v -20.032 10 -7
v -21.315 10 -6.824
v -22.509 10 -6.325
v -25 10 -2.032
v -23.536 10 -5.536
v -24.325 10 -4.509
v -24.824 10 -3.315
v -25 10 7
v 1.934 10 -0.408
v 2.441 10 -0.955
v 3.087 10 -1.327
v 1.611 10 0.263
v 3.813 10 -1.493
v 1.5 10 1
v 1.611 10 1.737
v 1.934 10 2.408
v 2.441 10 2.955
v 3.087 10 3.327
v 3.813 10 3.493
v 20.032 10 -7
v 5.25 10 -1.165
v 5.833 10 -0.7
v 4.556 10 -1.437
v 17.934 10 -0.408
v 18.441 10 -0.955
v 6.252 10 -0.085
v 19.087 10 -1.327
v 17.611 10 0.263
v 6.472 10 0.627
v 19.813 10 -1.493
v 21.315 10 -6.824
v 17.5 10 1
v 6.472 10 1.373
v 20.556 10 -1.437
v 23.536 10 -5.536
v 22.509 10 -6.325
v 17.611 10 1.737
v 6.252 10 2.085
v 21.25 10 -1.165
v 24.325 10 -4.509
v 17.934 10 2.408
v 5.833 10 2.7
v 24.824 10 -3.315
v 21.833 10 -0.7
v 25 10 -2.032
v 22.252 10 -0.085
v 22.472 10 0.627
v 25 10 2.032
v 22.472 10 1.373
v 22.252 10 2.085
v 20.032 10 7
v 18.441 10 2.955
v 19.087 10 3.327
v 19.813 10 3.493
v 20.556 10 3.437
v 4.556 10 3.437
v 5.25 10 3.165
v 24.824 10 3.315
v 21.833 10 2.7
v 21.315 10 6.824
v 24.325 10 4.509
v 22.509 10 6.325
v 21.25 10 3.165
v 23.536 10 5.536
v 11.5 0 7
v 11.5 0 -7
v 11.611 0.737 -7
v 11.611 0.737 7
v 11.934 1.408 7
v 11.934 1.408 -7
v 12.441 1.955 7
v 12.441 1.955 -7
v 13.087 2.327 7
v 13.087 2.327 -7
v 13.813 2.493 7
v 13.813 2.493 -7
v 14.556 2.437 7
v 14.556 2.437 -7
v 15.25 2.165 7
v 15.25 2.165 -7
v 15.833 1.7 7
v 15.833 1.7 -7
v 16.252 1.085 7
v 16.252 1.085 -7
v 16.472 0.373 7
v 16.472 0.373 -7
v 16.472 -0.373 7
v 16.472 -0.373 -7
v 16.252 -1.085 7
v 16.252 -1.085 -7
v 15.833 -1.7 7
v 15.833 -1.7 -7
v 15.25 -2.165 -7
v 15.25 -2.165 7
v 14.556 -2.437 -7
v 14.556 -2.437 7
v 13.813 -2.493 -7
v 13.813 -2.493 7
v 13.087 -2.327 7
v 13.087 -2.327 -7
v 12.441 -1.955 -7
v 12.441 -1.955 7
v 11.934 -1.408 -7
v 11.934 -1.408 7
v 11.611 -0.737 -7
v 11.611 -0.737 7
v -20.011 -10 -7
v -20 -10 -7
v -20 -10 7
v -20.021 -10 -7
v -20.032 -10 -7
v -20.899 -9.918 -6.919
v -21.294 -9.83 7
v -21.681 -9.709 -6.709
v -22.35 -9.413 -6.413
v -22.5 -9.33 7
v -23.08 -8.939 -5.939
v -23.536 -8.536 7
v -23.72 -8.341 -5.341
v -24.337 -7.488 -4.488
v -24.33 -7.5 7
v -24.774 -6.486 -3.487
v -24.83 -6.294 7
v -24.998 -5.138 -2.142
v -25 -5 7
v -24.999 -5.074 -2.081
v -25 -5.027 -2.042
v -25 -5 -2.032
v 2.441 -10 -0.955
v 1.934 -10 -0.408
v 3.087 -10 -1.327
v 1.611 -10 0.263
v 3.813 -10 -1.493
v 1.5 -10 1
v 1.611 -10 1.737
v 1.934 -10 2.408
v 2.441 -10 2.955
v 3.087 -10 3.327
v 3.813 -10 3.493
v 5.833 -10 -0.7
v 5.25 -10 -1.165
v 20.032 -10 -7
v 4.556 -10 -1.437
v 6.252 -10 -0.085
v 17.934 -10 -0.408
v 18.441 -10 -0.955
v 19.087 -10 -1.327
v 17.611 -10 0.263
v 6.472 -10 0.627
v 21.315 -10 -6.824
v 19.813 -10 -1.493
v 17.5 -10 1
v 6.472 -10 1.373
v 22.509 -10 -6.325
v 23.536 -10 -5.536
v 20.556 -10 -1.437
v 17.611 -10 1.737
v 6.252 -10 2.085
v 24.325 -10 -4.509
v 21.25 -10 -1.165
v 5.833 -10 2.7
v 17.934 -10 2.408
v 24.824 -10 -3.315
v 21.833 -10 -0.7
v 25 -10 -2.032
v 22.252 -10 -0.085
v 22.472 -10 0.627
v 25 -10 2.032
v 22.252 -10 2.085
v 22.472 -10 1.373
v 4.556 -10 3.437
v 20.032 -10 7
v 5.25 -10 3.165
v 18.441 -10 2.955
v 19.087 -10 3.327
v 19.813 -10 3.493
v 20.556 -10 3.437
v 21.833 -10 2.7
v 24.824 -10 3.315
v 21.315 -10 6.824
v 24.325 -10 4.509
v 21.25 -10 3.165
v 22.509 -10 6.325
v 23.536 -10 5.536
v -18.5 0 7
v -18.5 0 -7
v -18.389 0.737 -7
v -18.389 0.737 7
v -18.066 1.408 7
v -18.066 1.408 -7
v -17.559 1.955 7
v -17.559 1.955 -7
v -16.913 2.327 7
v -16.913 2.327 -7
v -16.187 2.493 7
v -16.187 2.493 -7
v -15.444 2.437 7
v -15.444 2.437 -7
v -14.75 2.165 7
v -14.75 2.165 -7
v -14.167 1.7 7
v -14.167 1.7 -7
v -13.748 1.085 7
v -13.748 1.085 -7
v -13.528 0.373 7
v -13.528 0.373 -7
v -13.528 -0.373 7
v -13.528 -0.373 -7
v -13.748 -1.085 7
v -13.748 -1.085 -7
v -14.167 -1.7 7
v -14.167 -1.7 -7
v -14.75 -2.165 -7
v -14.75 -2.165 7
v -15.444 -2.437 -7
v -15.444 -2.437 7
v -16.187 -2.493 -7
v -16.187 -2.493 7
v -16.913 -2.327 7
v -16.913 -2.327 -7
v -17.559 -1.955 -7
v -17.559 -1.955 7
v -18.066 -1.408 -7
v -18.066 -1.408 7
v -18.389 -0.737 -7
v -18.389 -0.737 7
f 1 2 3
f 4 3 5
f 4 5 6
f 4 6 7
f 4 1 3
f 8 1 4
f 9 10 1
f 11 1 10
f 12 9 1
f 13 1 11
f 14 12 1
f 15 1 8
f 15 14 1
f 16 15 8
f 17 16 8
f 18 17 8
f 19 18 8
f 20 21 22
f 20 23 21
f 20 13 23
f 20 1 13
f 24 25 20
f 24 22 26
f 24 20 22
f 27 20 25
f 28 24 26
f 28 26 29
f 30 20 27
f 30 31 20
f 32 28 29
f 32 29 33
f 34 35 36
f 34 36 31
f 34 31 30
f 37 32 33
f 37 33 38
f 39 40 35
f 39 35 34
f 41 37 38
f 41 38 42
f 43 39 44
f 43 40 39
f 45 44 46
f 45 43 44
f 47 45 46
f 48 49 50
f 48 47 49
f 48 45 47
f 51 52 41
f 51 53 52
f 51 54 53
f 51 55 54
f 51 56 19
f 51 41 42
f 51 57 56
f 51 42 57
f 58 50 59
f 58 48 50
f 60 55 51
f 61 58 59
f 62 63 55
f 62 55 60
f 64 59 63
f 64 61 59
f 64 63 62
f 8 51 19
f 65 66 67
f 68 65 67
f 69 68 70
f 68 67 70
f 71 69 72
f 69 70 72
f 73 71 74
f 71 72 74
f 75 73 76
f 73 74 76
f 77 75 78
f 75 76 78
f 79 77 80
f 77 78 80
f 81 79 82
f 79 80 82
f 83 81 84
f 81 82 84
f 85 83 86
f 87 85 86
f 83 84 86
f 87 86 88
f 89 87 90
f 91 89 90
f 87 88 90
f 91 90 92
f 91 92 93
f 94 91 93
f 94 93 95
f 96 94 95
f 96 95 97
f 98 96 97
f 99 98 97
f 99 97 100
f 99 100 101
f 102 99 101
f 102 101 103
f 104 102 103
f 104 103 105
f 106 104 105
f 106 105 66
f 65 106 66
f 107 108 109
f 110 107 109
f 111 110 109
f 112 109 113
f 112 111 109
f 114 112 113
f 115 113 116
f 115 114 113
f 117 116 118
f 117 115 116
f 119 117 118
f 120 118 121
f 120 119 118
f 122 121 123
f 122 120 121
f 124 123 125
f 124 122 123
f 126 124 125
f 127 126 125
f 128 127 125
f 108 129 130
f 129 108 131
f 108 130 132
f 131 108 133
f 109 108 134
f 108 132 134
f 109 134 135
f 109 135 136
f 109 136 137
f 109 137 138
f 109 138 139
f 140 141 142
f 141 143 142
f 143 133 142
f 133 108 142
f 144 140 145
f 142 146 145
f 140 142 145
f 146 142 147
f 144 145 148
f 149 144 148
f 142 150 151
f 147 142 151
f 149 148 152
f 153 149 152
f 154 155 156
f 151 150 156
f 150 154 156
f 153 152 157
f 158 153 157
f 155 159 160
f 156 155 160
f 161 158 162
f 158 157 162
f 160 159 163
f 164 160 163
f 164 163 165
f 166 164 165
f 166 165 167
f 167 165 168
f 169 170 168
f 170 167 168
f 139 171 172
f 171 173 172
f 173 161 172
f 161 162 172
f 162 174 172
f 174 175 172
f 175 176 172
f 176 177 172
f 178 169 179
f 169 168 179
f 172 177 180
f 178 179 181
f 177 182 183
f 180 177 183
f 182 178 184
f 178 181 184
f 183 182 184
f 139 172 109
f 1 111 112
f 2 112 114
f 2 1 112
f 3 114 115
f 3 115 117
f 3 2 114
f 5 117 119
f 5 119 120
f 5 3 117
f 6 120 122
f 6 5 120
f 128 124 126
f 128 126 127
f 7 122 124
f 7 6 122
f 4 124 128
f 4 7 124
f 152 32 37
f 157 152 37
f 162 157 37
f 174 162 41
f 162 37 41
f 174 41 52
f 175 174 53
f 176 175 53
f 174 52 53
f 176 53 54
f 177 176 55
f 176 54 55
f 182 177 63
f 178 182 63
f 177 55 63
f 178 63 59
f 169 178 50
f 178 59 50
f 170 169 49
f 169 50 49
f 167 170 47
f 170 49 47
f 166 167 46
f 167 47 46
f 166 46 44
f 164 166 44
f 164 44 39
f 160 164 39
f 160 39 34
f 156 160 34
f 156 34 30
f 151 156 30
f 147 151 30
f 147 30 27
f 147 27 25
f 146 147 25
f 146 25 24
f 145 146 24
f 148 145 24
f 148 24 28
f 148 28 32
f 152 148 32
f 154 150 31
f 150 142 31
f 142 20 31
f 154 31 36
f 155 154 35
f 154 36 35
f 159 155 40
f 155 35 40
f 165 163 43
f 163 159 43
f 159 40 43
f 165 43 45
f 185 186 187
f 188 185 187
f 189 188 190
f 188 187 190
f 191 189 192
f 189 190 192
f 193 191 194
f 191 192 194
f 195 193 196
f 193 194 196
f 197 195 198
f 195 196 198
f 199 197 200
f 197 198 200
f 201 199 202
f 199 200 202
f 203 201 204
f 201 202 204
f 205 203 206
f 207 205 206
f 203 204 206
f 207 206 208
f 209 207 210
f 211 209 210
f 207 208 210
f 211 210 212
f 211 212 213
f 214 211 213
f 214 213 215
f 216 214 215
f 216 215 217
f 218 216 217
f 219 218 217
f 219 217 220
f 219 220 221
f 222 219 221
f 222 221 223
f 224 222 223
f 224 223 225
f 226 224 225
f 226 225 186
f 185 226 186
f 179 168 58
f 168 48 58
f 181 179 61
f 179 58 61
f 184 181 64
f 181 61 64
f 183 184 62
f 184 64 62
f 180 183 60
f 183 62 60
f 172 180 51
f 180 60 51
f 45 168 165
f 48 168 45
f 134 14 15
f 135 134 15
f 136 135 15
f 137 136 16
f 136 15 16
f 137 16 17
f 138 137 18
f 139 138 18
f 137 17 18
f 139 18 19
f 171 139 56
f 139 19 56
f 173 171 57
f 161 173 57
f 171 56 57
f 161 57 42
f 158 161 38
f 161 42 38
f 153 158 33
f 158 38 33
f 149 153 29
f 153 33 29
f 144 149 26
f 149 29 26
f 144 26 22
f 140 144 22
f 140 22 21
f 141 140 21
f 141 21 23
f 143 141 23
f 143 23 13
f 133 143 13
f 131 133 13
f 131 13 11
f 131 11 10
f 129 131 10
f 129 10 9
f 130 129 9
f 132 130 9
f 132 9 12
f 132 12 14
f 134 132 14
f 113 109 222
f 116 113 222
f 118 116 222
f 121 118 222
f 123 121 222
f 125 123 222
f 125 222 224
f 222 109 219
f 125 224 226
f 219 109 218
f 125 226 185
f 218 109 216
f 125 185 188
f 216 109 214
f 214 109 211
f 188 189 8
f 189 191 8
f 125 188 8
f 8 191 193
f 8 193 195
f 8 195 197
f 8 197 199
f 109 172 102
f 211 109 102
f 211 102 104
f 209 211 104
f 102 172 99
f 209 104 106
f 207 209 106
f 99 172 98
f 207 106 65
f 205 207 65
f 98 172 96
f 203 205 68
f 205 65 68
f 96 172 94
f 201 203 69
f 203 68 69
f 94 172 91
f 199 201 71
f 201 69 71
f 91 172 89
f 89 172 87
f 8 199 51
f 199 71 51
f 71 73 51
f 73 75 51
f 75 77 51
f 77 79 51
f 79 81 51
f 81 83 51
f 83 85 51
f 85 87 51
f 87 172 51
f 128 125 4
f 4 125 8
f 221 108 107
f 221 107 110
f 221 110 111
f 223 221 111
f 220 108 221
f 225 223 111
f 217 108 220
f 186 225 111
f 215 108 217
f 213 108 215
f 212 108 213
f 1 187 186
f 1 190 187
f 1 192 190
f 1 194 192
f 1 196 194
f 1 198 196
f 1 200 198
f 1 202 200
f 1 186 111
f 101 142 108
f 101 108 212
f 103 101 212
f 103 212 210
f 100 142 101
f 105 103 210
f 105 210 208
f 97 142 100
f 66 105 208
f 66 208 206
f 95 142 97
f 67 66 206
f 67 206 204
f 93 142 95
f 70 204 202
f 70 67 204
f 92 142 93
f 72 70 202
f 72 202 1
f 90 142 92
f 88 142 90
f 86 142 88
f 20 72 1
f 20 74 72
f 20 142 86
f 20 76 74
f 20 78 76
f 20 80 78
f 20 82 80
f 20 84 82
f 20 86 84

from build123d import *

# Parameters (mm, degrees)
F0_W        = 20
F0_H        = 14
F1_DEPTH    = 25
F3_D        = 5
F5_D        = 5
F6_T1_DEPTH = 44.999500005
F7_T1_DEPTH = 34.0317226184


# Not quite as in the source:
# - a fillet or chamfer that OpenCascade refuses, or shapes differently, is made with other operations: its cross-section is extruded or revolved along the edge and cut away or added


with BuildPart() as f1:
    # F0 (on Right) → F1 (new body, symmetric)
    with BuildSketch(Plane.YZ):
        Rectangle(F0_W, F0_H)
    extrude(amount=F1_DEPTH, both=True)

    # F3 (through all)
    with Locations(Plane.XZ.offset(10)):
        with Locations((4, 1), (20, 1)):
            Hole(F3_D / 2)

    # F5 (through all)
    with Locations(Plane.XY.offset(7)):
        with Locations((-16, 0), (14, 0)):
            Hole(F5_D / 2)

    # F6: fillet of radius 5 on 3 edges, made by hand

    # F6_s2 → F6_t1 (cut)
    with BuildSketch(Plane.XZ.offset(-22.4997500025)):
        with BuildLine():
            ThreePointArc((25.0001, 2.0001), (23.5356339059, 5.5356339059), (20.0001, 7.0001))
            Line((20.0001, 7.0001), (20.0001, 7.1001))
            ThreePointArc((20.0001, 7.1001), (22.50005, 7.1), (25, 7.1))
            Line((25, 7.1), (25.1, 7))
            ThreePointArc((25.1, 7), (25.1, 4.50005), (25.1001, 2.0001))
            Line((25.1001, 2.0001), (25.0001, 2.0001))
        make_face()
        with BuildLine():
            ThreePointArc((-20.0001, -7.0001), (-23.5356339059, -5.5356339059), (-25.0001, -2.0001))
            Line((-25.0001, -2.0001), (-25.1001, -2.0001))
            ThreePointArc((-25.1001, -2.0001), (-25.1, -4.50005), (-25.1, -7))
            Line((-25.1, -7), (-25, -7.1))
            ThreePointArc((-25, -7.1), (-22.50005, -7.1), (-20.0001, -7.1001))
            Line((-20.0001, -7.1001), (-20.0001, -7.0001))
        make_face()
        with BuildLine():
            ThreePointArc((20.0001, -7.0001), (23.5356339059, -5.5356339059), (25.0001, -2.0001))
            Line((25.0001, -2.0001), (25.1001, -2.0001))
            ThreePointArc((25.1001, -2.0001), (25.1, -4.50005), (25.1, -7))
            Line((25.1, -7), (25, -7.1))
            ThreePointArc((25, -7.1), (22.50005, -7.1), (20.0001, -7.1001))
            Line((20.0001, -7.1001), (20.0001, -7.0001))
        make_face()
    extrude(amount=F6_T1_DEPTH, mode=Mode.SUBTRACT)

    # F7: fillet of radius 5 on 1 edges, made by hand

    # F7_s2 → F7_t1 (cut)
    with BuildSketch(Plane.XY.offset(-14.5317226184)):
        with BuildLine():
            ThreePointArc((-20, -10), (-23.5355339059, -8.5355339059), (-25, -5))
            Line((-25, -5), (-25, -10))
            Line((-25, -10), (-20, -10))
        make_face()
    extrude(amount=F7_T1_DEPTH, mode=Mode.SUBTRACT)


solid = f1.part
